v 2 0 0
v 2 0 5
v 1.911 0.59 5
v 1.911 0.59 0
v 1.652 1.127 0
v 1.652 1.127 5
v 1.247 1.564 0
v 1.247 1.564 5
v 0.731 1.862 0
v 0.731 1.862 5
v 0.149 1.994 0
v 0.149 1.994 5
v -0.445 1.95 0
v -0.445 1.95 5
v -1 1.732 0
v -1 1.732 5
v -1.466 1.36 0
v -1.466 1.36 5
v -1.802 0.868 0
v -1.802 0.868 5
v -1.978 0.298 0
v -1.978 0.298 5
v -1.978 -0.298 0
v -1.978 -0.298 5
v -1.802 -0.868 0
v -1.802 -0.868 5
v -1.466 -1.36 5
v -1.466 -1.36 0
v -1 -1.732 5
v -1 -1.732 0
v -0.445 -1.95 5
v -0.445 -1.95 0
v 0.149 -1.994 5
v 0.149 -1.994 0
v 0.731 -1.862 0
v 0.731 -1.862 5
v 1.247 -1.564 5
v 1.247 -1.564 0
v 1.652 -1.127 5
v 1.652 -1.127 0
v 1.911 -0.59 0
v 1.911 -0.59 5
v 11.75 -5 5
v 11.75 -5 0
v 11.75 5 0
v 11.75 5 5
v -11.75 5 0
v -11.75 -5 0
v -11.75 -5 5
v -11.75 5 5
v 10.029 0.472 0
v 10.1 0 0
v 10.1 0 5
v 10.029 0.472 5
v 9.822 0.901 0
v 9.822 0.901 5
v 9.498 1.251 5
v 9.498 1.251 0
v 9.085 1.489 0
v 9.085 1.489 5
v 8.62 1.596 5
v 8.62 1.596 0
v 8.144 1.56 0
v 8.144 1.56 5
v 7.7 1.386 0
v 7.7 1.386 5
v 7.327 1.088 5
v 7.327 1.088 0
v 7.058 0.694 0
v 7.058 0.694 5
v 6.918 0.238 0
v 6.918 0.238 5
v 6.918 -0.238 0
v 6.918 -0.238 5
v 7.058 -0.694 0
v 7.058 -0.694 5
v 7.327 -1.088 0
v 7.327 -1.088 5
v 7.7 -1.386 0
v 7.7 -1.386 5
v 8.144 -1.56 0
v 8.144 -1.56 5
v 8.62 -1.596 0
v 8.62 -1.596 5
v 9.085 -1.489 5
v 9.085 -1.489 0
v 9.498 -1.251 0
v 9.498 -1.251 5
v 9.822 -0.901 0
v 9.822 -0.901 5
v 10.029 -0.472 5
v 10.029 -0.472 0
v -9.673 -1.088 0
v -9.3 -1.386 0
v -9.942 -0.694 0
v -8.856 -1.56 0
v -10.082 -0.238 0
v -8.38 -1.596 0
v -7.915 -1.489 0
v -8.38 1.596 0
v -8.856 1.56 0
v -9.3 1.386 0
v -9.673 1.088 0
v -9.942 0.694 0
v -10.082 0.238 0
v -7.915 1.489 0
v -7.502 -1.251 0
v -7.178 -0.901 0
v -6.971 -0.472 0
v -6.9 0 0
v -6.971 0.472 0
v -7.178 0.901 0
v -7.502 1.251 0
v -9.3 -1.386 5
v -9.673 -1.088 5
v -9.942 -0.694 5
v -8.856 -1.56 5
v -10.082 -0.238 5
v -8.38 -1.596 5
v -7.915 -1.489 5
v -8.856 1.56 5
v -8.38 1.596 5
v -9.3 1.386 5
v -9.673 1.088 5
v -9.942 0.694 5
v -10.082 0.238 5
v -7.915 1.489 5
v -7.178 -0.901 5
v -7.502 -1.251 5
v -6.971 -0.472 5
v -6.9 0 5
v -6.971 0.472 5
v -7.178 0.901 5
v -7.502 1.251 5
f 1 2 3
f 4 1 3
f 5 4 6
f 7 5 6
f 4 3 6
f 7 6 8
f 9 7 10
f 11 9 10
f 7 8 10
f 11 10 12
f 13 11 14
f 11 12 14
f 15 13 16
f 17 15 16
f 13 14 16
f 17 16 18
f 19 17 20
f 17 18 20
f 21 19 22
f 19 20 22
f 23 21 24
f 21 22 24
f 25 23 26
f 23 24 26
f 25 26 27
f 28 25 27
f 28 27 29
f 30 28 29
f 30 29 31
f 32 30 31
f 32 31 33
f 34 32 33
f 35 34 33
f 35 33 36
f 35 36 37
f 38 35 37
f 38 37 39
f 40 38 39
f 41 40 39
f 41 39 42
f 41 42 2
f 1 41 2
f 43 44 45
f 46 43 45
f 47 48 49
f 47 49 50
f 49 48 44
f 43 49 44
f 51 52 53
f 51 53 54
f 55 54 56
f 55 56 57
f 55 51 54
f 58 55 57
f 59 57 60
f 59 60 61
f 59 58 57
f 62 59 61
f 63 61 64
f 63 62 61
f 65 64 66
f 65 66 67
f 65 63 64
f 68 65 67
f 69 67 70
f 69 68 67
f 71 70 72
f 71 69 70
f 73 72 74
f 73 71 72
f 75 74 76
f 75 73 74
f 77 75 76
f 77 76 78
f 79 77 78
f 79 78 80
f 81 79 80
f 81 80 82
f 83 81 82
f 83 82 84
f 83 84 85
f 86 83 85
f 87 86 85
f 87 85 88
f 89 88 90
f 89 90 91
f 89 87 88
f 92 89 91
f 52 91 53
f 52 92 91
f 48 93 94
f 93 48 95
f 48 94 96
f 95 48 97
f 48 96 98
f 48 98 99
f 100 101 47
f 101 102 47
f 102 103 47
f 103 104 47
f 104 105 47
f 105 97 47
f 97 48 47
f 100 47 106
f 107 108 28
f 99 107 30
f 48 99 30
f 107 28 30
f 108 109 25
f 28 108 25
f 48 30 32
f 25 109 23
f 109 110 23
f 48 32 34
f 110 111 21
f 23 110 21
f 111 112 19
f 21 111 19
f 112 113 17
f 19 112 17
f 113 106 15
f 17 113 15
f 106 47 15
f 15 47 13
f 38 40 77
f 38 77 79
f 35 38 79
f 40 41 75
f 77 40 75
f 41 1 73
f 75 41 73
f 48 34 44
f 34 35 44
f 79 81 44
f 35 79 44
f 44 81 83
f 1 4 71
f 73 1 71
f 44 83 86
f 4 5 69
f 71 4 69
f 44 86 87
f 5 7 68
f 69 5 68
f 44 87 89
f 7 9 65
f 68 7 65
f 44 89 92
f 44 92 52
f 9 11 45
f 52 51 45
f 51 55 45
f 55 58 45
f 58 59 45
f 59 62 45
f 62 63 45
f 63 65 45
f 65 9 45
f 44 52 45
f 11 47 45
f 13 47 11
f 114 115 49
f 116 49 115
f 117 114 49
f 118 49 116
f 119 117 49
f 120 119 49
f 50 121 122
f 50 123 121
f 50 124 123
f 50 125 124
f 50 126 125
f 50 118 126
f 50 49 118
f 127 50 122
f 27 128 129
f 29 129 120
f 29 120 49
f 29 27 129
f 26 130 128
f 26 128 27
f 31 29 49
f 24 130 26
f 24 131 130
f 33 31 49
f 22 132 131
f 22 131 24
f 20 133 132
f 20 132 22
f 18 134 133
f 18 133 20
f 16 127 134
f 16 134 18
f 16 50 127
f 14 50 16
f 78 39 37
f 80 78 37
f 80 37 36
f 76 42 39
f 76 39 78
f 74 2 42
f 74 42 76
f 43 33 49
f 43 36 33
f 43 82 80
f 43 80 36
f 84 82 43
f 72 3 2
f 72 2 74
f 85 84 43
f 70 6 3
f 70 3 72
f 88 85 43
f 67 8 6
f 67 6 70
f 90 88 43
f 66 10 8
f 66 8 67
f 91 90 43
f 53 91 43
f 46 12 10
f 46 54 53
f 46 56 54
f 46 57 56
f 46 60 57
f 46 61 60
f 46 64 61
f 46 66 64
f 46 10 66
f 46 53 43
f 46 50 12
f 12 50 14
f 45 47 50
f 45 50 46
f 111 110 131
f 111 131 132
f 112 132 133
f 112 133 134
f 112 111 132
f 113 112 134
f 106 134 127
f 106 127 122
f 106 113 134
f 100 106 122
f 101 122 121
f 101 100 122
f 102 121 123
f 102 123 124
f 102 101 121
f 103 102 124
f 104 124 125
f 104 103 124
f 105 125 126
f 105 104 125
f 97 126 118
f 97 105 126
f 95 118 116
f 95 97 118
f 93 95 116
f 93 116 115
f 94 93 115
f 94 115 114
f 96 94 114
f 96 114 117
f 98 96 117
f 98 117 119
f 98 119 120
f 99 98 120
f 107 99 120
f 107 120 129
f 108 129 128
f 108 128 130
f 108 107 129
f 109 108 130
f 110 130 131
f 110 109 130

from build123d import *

# Parameters (mm, degrees)
SKETCH_1_W          = 23.5
SKETCH_1_H          = 10
SKETCH_1_R          = 1.6
EXTRUDE_1_DEPTH     = 5
SKETCH_2_R          = 2
CUT_EXTRUDE_1_DEPTH = 10


with BuildPart() as part:
    # 草图1 → 凸台-拉伸1 (new body)
    with BuildSketch(Plane.XY):
        Rectangle(SKETCH_1_W, SKETCH_1_H)
        with Locations((-8.5, 0)):
            Circle(SKETCH_1_R, mode=Mode.SUBTRACT)
        with Locations((8.5, 0)):
            Circle(SKETCH_1_R, mode=Mode.SUBTRACT)
    extrude(amount=EXTRUDE_1_DEPTH)

    # 草图2 → 切除-拉伸1 (cut)
    with BuildSketch(Plane.XY.offset(5)):
        Circle(SKETCH_2_R)
    extrude(amount=-CUT_EXTRUDE_1_DEPTH, mode=Mode.SUBTRACT)


solid = part.part
